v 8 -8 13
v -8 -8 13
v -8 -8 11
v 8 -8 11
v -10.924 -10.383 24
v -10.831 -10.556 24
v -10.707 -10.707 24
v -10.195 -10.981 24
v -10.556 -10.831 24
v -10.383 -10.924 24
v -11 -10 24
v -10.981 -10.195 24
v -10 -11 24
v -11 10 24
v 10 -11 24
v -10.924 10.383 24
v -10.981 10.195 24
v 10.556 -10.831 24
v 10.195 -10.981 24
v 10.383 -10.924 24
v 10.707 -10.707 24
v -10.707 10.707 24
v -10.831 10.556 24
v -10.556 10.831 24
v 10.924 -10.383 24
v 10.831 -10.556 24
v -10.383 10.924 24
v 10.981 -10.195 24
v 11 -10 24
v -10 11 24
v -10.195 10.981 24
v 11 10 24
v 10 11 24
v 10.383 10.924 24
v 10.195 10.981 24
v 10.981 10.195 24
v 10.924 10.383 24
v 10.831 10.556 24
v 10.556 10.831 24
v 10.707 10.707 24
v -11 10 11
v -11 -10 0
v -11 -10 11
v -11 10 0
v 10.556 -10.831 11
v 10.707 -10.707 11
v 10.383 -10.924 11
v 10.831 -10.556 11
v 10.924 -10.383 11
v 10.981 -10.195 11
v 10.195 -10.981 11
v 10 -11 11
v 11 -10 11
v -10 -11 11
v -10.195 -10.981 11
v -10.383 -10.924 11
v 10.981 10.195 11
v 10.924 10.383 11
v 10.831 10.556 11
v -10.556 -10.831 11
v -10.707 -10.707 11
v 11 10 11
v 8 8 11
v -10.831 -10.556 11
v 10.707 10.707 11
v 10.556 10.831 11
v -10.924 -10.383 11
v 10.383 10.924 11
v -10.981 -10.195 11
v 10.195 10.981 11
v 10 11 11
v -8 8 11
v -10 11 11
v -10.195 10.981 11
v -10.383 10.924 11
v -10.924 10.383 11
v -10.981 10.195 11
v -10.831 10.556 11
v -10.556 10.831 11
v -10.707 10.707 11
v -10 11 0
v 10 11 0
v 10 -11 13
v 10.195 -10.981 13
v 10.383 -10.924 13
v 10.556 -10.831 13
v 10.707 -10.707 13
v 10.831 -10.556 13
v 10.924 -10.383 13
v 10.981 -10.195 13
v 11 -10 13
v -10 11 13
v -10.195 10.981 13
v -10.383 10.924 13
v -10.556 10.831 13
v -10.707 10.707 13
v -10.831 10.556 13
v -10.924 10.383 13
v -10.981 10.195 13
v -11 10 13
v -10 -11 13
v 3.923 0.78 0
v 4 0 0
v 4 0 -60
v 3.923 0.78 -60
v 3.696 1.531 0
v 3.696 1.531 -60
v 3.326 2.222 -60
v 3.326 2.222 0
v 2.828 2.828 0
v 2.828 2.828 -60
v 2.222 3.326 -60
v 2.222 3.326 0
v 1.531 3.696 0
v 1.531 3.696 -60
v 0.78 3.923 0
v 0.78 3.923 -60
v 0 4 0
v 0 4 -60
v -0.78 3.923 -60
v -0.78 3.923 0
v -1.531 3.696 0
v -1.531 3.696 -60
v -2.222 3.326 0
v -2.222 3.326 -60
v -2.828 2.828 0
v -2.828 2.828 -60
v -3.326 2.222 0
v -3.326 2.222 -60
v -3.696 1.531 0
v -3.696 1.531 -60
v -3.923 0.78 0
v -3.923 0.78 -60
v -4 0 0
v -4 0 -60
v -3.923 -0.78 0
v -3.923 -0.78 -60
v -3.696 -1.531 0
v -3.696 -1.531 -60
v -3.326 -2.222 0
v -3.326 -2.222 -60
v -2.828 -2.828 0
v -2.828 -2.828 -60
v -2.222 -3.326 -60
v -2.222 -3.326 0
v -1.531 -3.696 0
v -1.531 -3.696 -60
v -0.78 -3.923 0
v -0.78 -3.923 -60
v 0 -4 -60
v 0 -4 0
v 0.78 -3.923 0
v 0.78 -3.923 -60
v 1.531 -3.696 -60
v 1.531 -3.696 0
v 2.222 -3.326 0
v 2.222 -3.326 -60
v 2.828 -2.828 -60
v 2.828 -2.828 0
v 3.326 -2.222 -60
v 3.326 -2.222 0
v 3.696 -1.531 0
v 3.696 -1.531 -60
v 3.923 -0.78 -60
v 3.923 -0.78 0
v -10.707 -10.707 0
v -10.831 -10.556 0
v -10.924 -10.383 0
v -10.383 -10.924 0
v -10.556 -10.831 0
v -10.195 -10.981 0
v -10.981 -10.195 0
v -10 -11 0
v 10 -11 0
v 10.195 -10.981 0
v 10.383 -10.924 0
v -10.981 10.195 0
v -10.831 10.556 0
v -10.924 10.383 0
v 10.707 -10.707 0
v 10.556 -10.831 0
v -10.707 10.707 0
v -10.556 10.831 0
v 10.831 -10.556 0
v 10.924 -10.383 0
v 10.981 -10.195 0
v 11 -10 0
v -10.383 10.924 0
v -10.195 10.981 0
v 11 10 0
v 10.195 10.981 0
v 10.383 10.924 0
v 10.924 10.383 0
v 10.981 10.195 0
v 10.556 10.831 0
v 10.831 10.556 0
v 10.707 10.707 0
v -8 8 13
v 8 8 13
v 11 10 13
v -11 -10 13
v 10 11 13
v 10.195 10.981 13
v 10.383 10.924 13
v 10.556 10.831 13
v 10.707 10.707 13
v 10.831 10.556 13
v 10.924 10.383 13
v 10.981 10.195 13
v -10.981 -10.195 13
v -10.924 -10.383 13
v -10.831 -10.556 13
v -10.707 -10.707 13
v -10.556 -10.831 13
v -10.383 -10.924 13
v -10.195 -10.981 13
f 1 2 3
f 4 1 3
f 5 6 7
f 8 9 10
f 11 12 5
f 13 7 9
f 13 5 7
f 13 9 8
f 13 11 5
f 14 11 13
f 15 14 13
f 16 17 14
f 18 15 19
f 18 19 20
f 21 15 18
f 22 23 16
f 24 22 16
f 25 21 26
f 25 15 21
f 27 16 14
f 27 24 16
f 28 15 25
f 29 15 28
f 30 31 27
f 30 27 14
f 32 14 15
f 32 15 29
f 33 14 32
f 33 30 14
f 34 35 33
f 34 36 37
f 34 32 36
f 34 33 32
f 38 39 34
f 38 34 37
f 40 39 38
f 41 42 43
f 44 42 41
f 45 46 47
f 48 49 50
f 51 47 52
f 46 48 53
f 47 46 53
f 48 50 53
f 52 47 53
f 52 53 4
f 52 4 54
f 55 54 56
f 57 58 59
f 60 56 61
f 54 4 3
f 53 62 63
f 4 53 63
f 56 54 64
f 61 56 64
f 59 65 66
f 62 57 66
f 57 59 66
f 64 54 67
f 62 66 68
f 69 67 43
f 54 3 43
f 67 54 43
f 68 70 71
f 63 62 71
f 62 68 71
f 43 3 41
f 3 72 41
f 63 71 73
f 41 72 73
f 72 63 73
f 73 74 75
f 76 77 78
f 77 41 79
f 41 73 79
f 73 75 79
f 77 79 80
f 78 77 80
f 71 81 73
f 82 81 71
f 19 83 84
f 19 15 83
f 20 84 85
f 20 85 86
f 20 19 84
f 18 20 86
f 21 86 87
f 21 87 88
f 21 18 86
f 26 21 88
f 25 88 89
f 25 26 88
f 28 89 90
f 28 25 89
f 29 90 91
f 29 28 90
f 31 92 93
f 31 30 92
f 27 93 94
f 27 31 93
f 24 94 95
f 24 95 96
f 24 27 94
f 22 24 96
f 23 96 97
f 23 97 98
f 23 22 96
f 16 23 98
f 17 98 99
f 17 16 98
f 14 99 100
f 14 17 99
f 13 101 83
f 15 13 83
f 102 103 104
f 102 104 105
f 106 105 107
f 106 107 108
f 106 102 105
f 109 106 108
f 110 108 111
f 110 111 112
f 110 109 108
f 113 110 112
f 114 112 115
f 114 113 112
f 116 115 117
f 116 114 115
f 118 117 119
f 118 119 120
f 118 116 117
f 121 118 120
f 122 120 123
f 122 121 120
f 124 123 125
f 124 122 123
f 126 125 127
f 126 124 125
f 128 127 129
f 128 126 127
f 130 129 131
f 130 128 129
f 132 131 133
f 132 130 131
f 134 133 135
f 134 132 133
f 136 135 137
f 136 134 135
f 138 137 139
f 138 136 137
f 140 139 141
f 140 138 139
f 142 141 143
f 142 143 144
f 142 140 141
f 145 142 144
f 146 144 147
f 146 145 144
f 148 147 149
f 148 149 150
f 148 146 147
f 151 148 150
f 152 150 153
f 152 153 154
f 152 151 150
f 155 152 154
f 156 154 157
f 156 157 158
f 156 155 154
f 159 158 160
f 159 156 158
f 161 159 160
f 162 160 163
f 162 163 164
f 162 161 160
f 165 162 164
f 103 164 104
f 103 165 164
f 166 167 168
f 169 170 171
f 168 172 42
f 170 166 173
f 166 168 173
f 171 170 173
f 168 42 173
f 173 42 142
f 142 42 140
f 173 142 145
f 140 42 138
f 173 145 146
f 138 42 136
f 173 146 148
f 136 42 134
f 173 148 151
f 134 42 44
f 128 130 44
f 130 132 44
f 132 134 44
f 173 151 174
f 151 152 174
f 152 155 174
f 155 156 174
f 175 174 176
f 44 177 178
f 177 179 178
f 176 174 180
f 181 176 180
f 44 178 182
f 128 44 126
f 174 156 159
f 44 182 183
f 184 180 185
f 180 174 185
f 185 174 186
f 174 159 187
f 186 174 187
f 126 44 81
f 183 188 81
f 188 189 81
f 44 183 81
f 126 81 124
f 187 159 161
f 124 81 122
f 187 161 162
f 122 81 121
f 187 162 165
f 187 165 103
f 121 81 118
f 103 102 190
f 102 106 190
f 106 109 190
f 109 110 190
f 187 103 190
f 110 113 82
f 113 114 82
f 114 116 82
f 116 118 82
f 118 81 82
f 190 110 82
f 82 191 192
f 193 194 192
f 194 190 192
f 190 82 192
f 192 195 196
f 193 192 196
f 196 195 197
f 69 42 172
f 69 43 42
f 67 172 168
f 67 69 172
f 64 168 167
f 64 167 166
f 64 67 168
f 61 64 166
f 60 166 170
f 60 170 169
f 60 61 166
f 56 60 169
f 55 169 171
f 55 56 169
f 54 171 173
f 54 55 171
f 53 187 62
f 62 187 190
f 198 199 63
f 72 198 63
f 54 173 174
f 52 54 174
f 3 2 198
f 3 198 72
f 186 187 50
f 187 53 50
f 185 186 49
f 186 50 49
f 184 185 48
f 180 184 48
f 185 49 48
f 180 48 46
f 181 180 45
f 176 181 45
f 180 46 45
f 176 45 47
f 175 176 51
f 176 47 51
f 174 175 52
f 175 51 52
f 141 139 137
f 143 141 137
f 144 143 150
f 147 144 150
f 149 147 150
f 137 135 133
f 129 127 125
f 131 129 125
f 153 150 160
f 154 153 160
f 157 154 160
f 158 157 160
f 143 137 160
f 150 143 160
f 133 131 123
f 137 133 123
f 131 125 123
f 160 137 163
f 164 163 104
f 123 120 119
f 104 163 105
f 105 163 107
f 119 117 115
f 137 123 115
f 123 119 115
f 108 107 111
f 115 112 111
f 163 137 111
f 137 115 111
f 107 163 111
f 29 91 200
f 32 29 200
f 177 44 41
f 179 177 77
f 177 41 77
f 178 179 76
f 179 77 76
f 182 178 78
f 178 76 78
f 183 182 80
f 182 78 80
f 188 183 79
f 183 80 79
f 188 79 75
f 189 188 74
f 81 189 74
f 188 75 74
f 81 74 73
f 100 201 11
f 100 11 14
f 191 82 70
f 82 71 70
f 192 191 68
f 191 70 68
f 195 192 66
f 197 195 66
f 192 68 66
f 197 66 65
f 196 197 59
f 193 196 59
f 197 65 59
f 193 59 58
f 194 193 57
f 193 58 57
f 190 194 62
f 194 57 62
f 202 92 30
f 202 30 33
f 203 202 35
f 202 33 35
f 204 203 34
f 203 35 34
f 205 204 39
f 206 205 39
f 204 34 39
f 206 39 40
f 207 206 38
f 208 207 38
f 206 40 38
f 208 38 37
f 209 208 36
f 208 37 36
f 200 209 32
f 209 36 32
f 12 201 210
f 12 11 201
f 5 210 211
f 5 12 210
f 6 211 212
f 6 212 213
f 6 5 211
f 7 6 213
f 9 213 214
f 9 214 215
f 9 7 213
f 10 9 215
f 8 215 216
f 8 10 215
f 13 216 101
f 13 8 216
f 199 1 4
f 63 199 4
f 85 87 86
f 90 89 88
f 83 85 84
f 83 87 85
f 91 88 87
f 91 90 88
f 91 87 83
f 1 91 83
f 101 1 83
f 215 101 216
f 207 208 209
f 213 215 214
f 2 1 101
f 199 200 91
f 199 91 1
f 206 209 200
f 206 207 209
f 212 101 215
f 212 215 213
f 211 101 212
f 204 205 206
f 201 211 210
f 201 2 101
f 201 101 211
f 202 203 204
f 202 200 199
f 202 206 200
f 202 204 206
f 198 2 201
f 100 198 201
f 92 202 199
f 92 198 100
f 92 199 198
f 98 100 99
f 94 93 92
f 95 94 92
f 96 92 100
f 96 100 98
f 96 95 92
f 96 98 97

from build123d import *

# Parameters (mm, degrees)
SKETCH1_W           = 22
SKETCH1_H           = 22
BOSS_EXTRUDE1_DEPTH = 24
SKETCH2_W           = 2
SKETCH2_H           = 22
CUT_EXTRUDE1_DEPTH  = 3
CIRPATTERN1_COUNT   = 4
FILLET1_R           = 1
SKETCH3_R           = 4
BOSS_EXTRUDE2_DEPTH = 60


with BuildPart() as part:
    # Sketch1 → Boss-Extrude1 (new body)
    with BuildSketch(Plane.XY):
        Rectangle(SKETCH1_W, SKETCH1_H)
    extrude(amount=BOSS_EXTRUDE1_DEPTH)

    # Sketch2 → Cut-Extrude1 (cut)
    with BuildSketch(Plane(origin=(11, 0, 0), x_dir=(0, 0, -1), z_dir=(1, 0, 0))):
        with Locations((-12, 0)):
            Rectangle(SKETCH2_W, SKETCH2_H)
    cut_extrude1 = extrude(amount=-CUT_EXTRUDE1_DEPTH, mode=Mode.SUBTRACT)

    # CirPattern1: Cut-Extrude1 ×4 about axis
    cirpattern1_axis = Axis((0, 0, 0), (0, 0, 1))
    for i in range(1, CIRPATTERN1_COUNT):
        add(cut_extrude1.rotate(cirpattern1_axis, i * 360 / CIRPATTERN1_COUNT), mode=Mode.SUBTRACT)

    # Fillet1
    fillet1_edges = [part.edges().sort_by_distance(p)[0] for p in [
        (11, -11, 5.5),
        (11, 11, 5.5),
        (-11, -11, 5.5),
        (-11, 11, 5.5),
        (11, -11, 18.5),
        (-11, -11, 18.5),
        (-11, 11, 18.5),
        (11, 11, 18.5),
    ]]
    fillet(fillet1_edges, radius=FILLET1_R)

    # Sketch3 → Boss-Extrude2 (add)
    with BuildSketch(Plane.XY):
        Circle(SKETCH3_R)
    extrude(amount=-BOSS_EXTRUDE2_DEPTH)


solid = part.part
